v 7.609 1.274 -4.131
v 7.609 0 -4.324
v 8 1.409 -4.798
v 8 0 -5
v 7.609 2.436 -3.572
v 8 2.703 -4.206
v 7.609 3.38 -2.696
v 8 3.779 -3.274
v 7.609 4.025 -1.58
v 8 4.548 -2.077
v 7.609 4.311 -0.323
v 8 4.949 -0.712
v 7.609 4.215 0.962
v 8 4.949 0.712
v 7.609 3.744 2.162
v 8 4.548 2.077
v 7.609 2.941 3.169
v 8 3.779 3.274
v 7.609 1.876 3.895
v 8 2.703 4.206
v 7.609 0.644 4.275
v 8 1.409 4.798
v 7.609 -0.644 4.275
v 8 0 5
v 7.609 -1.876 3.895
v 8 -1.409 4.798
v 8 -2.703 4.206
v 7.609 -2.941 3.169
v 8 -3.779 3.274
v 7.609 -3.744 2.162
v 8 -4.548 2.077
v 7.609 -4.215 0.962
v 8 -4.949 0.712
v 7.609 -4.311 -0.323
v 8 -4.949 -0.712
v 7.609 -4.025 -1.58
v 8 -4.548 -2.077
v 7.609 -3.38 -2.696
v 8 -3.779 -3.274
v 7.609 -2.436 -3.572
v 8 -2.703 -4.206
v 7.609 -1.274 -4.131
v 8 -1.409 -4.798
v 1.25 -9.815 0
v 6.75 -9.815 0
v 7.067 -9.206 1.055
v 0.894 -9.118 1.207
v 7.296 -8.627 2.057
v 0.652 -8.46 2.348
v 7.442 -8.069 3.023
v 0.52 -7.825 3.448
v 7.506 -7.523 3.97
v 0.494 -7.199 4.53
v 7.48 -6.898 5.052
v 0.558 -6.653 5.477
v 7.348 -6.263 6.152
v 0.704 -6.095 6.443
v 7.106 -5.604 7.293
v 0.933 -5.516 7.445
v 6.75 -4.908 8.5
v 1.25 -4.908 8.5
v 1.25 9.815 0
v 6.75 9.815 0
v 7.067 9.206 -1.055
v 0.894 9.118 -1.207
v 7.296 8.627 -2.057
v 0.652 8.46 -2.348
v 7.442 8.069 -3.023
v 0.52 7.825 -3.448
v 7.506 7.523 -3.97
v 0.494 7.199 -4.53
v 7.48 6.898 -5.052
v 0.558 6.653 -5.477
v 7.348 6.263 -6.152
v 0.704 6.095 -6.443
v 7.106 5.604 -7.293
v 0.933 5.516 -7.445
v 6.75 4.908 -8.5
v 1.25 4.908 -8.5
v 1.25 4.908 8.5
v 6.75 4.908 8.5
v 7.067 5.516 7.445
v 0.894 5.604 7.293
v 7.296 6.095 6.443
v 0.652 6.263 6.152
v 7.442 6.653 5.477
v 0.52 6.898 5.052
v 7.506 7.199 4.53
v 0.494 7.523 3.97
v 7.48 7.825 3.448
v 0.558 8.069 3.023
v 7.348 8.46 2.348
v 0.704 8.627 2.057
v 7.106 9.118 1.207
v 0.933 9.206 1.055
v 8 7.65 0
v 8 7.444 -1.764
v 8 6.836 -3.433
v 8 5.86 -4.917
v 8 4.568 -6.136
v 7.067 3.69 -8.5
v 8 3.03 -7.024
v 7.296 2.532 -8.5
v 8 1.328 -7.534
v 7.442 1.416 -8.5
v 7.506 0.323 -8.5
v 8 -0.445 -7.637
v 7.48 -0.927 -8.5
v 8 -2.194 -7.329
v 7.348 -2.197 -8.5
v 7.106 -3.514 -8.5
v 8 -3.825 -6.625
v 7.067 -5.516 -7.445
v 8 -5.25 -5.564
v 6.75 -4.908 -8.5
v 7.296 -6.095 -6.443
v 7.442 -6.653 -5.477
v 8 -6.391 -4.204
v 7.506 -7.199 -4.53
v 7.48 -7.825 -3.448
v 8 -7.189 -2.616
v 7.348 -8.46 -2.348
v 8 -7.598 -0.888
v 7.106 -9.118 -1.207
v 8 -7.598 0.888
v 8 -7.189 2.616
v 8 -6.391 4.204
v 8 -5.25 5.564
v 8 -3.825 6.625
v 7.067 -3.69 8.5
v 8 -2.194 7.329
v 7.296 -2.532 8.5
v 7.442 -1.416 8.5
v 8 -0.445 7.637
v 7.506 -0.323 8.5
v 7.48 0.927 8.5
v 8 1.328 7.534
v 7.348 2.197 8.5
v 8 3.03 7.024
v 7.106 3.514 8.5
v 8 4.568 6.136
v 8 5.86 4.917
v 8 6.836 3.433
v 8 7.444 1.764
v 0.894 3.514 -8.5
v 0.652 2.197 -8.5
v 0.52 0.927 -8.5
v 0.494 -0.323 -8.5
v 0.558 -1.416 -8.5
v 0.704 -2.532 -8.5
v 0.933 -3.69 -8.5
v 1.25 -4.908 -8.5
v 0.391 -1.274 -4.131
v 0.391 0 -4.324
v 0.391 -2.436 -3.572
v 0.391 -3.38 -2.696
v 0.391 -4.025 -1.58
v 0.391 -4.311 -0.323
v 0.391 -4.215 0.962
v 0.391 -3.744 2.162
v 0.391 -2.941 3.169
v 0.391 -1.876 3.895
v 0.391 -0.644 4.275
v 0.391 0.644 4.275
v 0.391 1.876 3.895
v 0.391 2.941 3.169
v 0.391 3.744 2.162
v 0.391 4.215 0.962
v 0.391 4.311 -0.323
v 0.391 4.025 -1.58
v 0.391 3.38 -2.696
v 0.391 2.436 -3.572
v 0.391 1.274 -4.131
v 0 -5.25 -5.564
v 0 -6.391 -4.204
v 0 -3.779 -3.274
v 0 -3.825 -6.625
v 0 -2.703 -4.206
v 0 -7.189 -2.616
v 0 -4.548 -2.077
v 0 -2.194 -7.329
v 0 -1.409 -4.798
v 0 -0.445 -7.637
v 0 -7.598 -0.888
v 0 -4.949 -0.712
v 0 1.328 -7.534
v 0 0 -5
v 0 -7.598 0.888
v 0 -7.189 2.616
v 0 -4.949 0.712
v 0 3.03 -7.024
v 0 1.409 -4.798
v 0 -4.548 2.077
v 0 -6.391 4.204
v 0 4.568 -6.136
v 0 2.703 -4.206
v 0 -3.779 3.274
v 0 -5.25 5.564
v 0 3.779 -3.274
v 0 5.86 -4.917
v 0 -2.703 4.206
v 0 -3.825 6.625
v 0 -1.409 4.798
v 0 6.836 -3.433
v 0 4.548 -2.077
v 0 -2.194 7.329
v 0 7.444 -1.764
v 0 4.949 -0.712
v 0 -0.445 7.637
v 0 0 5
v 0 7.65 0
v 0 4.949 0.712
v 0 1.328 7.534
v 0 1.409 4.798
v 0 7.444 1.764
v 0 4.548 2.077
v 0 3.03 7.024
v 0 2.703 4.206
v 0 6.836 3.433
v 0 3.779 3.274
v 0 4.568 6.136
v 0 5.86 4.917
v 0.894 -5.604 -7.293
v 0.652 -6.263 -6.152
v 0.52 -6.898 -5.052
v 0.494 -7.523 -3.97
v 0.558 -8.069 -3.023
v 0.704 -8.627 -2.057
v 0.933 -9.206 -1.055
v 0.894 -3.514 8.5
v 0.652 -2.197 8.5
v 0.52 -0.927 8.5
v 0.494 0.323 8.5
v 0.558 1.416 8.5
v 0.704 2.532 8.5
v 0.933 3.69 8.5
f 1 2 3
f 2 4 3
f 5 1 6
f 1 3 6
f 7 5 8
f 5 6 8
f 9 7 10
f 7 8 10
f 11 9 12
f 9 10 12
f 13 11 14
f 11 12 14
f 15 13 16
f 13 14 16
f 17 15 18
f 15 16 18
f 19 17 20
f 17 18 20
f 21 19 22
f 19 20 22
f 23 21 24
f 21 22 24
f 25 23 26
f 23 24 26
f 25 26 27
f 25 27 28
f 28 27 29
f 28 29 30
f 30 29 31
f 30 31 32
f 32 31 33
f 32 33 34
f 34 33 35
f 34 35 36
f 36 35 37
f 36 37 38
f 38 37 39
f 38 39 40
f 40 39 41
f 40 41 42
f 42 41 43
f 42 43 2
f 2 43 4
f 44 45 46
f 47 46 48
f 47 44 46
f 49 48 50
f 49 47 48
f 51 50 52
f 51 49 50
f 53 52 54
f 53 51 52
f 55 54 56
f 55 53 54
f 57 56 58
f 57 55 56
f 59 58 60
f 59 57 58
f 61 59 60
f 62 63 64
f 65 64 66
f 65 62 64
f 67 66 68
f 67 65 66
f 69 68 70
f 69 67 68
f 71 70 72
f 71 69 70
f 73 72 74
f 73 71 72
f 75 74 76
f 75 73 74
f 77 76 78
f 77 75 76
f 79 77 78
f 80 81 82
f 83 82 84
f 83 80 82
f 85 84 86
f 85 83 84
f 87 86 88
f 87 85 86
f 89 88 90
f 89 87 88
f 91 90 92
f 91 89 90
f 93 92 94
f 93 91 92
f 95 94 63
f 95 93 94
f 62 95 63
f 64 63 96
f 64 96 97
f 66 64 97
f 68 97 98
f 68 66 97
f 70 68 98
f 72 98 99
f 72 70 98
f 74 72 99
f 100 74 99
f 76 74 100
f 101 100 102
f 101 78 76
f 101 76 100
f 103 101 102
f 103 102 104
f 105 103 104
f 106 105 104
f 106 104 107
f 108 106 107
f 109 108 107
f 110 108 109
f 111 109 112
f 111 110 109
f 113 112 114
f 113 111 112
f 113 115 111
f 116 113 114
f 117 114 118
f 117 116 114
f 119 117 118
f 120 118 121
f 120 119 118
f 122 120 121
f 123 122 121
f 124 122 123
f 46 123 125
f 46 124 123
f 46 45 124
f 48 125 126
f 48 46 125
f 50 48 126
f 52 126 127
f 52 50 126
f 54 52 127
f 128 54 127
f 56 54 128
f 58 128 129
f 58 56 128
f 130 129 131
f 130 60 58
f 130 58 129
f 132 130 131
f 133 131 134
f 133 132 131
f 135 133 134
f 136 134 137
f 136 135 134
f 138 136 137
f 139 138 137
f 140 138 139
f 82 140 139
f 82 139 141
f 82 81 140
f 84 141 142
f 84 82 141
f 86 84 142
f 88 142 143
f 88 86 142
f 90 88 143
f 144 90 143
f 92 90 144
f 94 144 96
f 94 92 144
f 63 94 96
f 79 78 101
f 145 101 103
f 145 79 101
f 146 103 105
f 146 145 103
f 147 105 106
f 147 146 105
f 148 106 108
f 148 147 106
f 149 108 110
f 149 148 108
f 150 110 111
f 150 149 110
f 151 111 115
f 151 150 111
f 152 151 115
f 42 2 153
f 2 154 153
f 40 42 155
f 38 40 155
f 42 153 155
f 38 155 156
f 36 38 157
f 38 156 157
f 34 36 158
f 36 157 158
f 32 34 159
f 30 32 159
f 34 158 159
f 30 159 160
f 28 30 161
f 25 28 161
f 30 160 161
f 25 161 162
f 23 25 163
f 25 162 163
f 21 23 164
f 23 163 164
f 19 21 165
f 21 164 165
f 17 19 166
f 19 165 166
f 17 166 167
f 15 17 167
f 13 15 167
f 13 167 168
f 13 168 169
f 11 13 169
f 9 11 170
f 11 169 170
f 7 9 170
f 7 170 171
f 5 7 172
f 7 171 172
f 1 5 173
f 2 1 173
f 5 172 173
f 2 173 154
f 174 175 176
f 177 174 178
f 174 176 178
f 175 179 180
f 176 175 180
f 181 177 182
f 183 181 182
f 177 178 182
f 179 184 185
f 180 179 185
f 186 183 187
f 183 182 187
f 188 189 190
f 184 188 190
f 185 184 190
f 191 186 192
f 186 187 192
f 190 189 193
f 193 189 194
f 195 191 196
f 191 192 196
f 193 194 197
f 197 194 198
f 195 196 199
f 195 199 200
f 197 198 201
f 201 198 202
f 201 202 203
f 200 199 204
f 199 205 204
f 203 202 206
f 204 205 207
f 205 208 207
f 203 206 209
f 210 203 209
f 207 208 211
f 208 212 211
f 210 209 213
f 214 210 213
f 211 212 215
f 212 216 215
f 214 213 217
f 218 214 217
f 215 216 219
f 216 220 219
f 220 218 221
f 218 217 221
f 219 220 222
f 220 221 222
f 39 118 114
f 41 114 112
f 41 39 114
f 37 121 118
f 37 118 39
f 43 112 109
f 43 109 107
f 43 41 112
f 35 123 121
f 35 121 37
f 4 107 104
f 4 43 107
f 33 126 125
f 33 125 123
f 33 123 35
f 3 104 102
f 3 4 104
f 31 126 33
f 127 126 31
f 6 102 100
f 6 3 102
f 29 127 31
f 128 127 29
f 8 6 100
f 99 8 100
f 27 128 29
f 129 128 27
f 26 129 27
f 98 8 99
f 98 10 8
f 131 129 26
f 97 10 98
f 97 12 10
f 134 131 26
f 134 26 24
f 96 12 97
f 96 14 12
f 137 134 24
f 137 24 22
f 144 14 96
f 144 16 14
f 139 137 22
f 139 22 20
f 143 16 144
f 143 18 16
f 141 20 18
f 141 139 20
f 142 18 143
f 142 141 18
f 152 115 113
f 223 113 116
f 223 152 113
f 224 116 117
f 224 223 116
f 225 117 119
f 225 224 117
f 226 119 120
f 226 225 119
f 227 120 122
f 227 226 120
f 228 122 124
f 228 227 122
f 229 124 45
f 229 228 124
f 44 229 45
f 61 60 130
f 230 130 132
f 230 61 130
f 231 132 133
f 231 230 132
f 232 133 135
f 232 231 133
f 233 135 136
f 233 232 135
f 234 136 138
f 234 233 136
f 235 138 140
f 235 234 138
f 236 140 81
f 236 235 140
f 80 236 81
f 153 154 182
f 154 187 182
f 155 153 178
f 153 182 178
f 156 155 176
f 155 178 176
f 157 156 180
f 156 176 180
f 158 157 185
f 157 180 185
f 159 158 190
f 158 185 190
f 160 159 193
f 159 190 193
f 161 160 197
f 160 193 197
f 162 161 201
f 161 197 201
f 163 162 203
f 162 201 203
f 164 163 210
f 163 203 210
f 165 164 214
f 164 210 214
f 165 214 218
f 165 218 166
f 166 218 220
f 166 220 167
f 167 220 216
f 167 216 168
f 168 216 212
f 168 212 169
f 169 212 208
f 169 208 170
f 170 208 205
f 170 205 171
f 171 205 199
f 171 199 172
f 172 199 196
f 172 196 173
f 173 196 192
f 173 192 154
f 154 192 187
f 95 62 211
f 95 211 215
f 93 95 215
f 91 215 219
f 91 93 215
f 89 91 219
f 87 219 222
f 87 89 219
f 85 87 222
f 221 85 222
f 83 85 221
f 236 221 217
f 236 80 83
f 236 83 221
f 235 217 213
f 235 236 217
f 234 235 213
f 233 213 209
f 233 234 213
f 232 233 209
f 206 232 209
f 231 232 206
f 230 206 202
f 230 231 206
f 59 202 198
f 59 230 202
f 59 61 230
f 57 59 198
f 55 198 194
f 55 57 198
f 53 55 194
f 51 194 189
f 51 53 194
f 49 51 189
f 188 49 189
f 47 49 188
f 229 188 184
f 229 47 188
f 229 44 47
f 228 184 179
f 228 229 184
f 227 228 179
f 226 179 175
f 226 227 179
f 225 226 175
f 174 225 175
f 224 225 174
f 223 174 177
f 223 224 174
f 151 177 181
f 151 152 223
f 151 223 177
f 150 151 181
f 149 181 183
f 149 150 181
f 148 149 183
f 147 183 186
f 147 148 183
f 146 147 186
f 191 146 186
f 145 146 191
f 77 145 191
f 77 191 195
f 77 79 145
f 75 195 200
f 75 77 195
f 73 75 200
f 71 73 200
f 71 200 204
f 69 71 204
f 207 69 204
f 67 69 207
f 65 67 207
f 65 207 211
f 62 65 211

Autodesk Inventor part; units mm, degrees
ref_plane "YZ Plane" through (0, 0, 0) normal (1, 0, 0) x (0, 1, 0)
ref_plane "XZ Plane" through (0, 0, 0) normal (0, 1, 0) x (-1, 0, 0)
sketch "Sketch1" plane through (0, 0, 0) normal (1, 0, 0) x (0, 1, 0)
  line L0 (-9.815, 0) -> (-4.9075, 8.5)
  line L1 (-4.9075, 8.5) -> (4.9075, 8.5)
  line L2 (4.9075, 8.5) -> (9.815, 0)
  line L3 (9.815, 0) -> (4.9075, -8.5)
  line L4 (4.9075, -8.5) -> (-4.9075, -8.5)
  line L5 (-4.9075, -8.5) -> (-9.815, 0)
  point P0 (0, 0)
  point P1 (0, 0)
  dimension "d0" = 19.6299
extrude "Body" add sketch "Sketch1" along normal blind 8
sketch "Sketch2" plane through (0, 0, 0) normal (0, 0, 1) x (1, 0, 0)
  line L0 (0, 4.9075) -> (0, 9.815) projected
  line L1 (0, 9.815) -> (8, 9.815) projected
  line L2 (8, 4.9075) -> (8, 9.815) projected
  line L3 (-1.6, 0) -> (9.6, 0) projected
  line L4 (1.2499, 9.815) -> (0, 7.65)
  line L5 (6.7501, 9.815) -> (8, 7.65)
  dimension "d3" = 30
  dimension "d4" = 30
  dimension "d5" = 15.3
  dimension "d6" = 15.3
revolve "Chamfer1" cut sketch "Sketch2" angle 360 about axis through (-10, 0, 0) along (1, 0, 0)
sketch "Sketch3" plane through (8, 0, 0) normal (1, 0, 0) x (0, 0, -1)
  arc A0 (-0.625, -1.0825) -> (0.625, -1.0825) centre (0, 0) ccw projected
hole "Thread" at (8, 0, 0) direction (-1, 0, 0) diameter 8.647 end through all thread size "M10x1.25" class "6H" standard "ISO Metric profile"
chamfer "Chamfer2" distance 0.6766 angle 30 1 edges at (8, 0, 4.3235) measured on face at (8, 6.4566, -0.784)
chamfer "Chamfer3" distance 0.6766 angle 30 1 edges at (0, 0, 4.3235) measured on face at (0, 6.4566, -0.784)
ref_plane "Work Plane1" through (-19.2723, 0, 0) normal (0, -0.866, -0.5) x (1, 0, 0)
equation "\"d0\" = 1.1547 * SW"
equation "\"d1\" = KOH"
equation "\"d8\" = -0.5 * GD1 + 0.5 * NND"
equation "\"d40\" = -0.5 * GD1 + 0.5 * NND"
equation "\"d10\" = -0.5 * GD1 + 0.5 * NND"
equation "\"d41\" = -0.5 * GD1 + 0.5 * NND"
equation "\"d3\" = ANG1"
equation "\"d4\" = ANG2"
equation "\"d5\" = SW0"
equation "\"d6\" = SW01"
equation "\"ANG1\" = 30deg"
equation "\"ANG2\" = 30deg"
equation "\"KOH\" = 8"
equation "\"SW\" = 17"
equation "\"SW0\" = SW01"
equation "\"SW01\" = 15.3"
equation "\"GUL\" = 0.541266 * PTC"
equation "\"TOA\" = 30deg"
equation "\"PTC\" = 1.25"
equation "\"E0\" = 1.155 * SW"
equation "\"GAL\" = 0.541266 * PTC"
equation "\"GD1\" = 8.646835"
equation "\"NND\" = 10"
properties part number "DIN 934 - M10 x 1,25" material "Steel, Mild"
